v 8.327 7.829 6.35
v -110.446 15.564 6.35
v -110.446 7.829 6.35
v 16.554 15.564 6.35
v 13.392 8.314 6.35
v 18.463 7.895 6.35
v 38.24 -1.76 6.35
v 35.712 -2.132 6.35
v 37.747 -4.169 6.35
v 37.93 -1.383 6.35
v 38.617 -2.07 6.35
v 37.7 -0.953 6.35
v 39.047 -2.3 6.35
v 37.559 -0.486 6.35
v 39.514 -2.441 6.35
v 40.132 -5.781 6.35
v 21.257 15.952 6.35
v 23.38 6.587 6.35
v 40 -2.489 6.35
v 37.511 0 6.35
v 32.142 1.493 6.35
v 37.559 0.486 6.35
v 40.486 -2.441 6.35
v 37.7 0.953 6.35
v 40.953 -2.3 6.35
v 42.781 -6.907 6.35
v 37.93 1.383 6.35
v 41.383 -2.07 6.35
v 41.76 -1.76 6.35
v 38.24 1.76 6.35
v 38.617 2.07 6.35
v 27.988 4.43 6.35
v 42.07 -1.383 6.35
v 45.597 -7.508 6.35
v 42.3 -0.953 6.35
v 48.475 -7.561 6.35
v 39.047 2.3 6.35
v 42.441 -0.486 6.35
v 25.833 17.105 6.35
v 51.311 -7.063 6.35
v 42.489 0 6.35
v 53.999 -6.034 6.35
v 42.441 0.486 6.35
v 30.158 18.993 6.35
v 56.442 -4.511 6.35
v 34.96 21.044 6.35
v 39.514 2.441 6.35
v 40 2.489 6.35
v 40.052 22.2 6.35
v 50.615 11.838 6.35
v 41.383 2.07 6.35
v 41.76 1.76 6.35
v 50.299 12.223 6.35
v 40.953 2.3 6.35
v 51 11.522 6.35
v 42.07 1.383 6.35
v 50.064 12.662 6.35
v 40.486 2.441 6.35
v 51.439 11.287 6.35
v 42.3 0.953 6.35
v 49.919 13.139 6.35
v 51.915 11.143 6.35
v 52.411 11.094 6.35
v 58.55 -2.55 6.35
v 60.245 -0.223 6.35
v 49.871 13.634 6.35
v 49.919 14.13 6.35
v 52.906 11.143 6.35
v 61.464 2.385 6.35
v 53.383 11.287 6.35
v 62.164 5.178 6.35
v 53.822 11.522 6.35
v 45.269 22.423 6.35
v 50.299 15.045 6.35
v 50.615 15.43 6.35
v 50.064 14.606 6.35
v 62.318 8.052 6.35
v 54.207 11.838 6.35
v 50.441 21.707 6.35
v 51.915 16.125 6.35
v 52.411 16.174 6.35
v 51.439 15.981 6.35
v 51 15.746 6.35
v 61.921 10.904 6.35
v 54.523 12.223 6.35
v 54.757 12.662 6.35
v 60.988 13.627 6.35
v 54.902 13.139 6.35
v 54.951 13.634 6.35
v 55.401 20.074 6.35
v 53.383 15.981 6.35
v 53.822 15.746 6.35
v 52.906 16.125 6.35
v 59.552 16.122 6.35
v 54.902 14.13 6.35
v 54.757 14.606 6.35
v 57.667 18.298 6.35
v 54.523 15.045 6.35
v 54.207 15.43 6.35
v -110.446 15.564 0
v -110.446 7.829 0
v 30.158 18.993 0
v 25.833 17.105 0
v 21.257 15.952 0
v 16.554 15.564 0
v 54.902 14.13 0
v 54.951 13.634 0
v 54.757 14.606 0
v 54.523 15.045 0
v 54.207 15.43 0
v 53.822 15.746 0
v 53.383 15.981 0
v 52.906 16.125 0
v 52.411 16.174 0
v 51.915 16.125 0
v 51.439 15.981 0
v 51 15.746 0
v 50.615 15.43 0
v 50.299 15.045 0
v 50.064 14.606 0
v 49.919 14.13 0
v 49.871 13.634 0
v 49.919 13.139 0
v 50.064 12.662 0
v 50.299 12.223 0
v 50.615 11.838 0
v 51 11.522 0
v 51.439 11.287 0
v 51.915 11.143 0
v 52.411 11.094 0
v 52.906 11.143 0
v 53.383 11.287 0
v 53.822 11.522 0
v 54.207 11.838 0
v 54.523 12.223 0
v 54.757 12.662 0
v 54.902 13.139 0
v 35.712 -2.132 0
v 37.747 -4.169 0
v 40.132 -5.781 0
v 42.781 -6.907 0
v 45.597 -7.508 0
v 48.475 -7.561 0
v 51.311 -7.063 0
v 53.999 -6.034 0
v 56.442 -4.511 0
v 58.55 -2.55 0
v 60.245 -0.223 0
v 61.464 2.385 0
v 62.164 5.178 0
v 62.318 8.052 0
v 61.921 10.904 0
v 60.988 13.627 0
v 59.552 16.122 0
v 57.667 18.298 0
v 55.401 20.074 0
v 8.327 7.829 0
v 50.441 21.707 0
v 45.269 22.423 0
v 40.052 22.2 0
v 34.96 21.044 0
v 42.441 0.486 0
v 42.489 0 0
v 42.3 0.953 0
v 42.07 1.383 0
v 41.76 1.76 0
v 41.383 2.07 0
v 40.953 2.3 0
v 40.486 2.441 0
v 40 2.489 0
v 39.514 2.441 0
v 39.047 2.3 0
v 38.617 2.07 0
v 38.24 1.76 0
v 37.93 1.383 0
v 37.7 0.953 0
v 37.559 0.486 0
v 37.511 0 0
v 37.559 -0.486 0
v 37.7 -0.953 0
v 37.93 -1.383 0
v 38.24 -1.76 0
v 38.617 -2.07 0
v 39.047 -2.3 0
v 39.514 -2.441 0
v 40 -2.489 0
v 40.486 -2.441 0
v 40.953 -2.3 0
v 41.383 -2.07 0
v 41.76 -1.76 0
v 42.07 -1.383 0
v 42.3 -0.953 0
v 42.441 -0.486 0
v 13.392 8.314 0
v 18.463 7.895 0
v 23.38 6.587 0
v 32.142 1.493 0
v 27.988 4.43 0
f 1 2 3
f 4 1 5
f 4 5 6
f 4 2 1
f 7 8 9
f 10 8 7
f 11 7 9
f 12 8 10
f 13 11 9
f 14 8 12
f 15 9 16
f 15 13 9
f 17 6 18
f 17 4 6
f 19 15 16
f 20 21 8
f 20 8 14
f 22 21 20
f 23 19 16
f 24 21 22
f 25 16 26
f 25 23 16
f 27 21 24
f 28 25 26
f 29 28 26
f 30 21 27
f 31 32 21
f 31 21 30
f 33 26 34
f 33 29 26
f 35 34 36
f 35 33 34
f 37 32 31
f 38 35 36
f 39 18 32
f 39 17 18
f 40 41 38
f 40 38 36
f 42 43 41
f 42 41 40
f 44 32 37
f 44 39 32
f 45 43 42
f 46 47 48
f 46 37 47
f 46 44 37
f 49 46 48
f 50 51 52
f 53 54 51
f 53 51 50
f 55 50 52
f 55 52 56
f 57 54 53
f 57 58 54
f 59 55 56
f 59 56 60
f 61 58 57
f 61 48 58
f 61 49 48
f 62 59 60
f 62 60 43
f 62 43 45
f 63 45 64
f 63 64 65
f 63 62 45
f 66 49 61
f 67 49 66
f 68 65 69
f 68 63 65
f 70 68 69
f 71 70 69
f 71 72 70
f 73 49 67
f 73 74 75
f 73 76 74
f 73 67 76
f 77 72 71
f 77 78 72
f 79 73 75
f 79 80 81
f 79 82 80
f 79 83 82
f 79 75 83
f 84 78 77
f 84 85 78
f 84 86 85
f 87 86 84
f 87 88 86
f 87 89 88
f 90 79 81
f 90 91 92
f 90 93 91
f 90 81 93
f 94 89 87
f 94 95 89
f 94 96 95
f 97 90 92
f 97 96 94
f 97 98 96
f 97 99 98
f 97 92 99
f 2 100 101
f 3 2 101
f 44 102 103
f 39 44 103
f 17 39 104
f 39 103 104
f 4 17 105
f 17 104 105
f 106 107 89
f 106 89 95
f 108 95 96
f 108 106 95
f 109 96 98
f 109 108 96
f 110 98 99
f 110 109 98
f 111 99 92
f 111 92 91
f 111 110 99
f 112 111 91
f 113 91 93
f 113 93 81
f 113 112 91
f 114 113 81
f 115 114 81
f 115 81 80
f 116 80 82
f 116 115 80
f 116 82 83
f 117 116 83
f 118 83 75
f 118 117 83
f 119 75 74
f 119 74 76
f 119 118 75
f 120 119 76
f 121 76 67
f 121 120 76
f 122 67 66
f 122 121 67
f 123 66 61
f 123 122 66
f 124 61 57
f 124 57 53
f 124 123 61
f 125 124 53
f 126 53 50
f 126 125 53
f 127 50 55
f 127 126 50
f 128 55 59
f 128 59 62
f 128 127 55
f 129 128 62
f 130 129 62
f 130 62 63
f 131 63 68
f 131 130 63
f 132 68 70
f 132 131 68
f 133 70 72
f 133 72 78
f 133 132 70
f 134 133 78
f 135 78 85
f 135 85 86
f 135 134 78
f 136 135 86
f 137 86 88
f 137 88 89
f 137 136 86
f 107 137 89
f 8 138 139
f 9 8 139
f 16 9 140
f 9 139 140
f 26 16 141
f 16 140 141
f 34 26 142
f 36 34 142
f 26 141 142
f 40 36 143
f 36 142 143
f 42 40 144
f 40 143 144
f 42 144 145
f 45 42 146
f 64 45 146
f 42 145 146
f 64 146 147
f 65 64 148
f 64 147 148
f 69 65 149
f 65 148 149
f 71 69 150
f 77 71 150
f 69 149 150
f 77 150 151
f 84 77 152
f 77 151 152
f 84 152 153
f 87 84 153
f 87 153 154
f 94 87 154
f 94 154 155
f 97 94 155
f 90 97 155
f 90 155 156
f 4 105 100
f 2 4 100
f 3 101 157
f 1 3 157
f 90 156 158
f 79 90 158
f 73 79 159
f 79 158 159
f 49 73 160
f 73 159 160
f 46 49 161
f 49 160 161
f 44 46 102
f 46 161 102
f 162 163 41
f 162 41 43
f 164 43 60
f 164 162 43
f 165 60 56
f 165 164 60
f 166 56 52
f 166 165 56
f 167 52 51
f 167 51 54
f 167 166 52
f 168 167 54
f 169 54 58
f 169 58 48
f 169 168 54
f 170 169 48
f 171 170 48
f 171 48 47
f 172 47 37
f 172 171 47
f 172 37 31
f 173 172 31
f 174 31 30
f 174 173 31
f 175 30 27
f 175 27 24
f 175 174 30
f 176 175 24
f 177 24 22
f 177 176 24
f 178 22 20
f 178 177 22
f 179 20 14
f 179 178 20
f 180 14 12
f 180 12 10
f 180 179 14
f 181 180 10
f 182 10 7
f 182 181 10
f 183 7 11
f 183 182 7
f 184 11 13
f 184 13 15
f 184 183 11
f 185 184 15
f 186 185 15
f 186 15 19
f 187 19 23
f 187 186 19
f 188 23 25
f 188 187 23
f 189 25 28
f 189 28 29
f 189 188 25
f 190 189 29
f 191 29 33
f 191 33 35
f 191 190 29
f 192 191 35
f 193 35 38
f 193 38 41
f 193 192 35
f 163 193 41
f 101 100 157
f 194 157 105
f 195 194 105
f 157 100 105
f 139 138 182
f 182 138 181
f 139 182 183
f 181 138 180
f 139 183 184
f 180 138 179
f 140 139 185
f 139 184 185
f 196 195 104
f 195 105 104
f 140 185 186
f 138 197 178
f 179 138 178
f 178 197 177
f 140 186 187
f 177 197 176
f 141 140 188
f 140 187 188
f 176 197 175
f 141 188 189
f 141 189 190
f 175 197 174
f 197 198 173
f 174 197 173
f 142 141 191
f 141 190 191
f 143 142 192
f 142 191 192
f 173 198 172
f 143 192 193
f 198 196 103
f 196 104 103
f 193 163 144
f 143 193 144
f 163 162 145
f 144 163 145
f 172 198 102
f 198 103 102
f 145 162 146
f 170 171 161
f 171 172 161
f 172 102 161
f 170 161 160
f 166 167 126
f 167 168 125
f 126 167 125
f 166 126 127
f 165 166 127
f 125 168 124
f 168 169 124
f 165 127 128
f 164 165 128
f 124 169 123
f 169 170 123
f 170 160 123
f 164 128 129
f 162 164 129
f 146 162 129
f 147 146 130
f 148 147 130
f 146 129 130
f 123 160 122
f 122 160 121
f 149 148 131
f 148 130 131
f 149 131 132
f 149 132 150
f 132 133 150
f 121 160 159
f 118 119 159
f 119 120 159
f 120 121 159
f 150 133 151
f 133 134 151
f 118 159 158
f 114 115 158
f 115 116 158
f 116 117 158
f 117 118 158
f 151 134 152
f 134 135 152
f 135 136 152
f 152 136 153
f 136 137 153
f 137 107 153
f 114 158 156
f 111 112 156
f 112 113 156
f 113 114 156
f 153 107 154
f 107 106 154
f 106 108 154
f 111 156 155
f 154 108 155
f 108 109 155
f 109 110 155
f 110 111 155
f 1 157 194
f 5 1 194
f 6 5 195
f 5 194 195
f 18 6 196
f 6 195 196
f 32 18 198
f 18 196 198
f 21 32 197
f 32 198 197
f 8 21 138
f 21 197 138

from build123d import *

# Parameters (mm, degrees)
SKETCH2_R           = 2.54
SKETCH2_R_2         = 2.4892
BOSS_EXTRUDE4_DEPTH = 6.35


with BuildPart() as part:
    # Sketch2 → Boss-Extrude4 (new body)
    with BuildSketch(Plane.XY):
        with BuildLine():
            Line((16.553800999, 15.563538937), (-110.446199, 15.563538937))
            Line((-110.446199, 15.563538937), (-110.446199, 7.829313497))
            Line((-110.446199, 7.829313497), (8.327469614, 7.829313497))
            ThreePointArc((8.327469614, 7.829313497), (23.37971128, 6.58692566), (35.712064399, -2.132396173))
            ThreePointArc((35.712064399, -2.132396173), (58.549875935, -2.549801063), (55.400729061, 20.07369859))
            ThreePointArc((55.400729061, 20.07369859), (42.655168222, 22.428960004), (30.15762825, 18.992672461))
            ThreePointArc((30.15762825, 18.992672461), (23.568483326, 16.434024055), (16.553800999, 15.563538937))
        make_face()
        with Locations((52.410677776, 13.634120609)):
            Circle(SKETCH2_R, mode=Mode.SUBTRACT)
        with Locations((40, 2e-09)):
            Circle(SKETCH2_R_2, mode=Mode.SUBTRACT)
    extrude(amount=BOSS_EXTRUDE4_DEPTH)


solid = part.part
